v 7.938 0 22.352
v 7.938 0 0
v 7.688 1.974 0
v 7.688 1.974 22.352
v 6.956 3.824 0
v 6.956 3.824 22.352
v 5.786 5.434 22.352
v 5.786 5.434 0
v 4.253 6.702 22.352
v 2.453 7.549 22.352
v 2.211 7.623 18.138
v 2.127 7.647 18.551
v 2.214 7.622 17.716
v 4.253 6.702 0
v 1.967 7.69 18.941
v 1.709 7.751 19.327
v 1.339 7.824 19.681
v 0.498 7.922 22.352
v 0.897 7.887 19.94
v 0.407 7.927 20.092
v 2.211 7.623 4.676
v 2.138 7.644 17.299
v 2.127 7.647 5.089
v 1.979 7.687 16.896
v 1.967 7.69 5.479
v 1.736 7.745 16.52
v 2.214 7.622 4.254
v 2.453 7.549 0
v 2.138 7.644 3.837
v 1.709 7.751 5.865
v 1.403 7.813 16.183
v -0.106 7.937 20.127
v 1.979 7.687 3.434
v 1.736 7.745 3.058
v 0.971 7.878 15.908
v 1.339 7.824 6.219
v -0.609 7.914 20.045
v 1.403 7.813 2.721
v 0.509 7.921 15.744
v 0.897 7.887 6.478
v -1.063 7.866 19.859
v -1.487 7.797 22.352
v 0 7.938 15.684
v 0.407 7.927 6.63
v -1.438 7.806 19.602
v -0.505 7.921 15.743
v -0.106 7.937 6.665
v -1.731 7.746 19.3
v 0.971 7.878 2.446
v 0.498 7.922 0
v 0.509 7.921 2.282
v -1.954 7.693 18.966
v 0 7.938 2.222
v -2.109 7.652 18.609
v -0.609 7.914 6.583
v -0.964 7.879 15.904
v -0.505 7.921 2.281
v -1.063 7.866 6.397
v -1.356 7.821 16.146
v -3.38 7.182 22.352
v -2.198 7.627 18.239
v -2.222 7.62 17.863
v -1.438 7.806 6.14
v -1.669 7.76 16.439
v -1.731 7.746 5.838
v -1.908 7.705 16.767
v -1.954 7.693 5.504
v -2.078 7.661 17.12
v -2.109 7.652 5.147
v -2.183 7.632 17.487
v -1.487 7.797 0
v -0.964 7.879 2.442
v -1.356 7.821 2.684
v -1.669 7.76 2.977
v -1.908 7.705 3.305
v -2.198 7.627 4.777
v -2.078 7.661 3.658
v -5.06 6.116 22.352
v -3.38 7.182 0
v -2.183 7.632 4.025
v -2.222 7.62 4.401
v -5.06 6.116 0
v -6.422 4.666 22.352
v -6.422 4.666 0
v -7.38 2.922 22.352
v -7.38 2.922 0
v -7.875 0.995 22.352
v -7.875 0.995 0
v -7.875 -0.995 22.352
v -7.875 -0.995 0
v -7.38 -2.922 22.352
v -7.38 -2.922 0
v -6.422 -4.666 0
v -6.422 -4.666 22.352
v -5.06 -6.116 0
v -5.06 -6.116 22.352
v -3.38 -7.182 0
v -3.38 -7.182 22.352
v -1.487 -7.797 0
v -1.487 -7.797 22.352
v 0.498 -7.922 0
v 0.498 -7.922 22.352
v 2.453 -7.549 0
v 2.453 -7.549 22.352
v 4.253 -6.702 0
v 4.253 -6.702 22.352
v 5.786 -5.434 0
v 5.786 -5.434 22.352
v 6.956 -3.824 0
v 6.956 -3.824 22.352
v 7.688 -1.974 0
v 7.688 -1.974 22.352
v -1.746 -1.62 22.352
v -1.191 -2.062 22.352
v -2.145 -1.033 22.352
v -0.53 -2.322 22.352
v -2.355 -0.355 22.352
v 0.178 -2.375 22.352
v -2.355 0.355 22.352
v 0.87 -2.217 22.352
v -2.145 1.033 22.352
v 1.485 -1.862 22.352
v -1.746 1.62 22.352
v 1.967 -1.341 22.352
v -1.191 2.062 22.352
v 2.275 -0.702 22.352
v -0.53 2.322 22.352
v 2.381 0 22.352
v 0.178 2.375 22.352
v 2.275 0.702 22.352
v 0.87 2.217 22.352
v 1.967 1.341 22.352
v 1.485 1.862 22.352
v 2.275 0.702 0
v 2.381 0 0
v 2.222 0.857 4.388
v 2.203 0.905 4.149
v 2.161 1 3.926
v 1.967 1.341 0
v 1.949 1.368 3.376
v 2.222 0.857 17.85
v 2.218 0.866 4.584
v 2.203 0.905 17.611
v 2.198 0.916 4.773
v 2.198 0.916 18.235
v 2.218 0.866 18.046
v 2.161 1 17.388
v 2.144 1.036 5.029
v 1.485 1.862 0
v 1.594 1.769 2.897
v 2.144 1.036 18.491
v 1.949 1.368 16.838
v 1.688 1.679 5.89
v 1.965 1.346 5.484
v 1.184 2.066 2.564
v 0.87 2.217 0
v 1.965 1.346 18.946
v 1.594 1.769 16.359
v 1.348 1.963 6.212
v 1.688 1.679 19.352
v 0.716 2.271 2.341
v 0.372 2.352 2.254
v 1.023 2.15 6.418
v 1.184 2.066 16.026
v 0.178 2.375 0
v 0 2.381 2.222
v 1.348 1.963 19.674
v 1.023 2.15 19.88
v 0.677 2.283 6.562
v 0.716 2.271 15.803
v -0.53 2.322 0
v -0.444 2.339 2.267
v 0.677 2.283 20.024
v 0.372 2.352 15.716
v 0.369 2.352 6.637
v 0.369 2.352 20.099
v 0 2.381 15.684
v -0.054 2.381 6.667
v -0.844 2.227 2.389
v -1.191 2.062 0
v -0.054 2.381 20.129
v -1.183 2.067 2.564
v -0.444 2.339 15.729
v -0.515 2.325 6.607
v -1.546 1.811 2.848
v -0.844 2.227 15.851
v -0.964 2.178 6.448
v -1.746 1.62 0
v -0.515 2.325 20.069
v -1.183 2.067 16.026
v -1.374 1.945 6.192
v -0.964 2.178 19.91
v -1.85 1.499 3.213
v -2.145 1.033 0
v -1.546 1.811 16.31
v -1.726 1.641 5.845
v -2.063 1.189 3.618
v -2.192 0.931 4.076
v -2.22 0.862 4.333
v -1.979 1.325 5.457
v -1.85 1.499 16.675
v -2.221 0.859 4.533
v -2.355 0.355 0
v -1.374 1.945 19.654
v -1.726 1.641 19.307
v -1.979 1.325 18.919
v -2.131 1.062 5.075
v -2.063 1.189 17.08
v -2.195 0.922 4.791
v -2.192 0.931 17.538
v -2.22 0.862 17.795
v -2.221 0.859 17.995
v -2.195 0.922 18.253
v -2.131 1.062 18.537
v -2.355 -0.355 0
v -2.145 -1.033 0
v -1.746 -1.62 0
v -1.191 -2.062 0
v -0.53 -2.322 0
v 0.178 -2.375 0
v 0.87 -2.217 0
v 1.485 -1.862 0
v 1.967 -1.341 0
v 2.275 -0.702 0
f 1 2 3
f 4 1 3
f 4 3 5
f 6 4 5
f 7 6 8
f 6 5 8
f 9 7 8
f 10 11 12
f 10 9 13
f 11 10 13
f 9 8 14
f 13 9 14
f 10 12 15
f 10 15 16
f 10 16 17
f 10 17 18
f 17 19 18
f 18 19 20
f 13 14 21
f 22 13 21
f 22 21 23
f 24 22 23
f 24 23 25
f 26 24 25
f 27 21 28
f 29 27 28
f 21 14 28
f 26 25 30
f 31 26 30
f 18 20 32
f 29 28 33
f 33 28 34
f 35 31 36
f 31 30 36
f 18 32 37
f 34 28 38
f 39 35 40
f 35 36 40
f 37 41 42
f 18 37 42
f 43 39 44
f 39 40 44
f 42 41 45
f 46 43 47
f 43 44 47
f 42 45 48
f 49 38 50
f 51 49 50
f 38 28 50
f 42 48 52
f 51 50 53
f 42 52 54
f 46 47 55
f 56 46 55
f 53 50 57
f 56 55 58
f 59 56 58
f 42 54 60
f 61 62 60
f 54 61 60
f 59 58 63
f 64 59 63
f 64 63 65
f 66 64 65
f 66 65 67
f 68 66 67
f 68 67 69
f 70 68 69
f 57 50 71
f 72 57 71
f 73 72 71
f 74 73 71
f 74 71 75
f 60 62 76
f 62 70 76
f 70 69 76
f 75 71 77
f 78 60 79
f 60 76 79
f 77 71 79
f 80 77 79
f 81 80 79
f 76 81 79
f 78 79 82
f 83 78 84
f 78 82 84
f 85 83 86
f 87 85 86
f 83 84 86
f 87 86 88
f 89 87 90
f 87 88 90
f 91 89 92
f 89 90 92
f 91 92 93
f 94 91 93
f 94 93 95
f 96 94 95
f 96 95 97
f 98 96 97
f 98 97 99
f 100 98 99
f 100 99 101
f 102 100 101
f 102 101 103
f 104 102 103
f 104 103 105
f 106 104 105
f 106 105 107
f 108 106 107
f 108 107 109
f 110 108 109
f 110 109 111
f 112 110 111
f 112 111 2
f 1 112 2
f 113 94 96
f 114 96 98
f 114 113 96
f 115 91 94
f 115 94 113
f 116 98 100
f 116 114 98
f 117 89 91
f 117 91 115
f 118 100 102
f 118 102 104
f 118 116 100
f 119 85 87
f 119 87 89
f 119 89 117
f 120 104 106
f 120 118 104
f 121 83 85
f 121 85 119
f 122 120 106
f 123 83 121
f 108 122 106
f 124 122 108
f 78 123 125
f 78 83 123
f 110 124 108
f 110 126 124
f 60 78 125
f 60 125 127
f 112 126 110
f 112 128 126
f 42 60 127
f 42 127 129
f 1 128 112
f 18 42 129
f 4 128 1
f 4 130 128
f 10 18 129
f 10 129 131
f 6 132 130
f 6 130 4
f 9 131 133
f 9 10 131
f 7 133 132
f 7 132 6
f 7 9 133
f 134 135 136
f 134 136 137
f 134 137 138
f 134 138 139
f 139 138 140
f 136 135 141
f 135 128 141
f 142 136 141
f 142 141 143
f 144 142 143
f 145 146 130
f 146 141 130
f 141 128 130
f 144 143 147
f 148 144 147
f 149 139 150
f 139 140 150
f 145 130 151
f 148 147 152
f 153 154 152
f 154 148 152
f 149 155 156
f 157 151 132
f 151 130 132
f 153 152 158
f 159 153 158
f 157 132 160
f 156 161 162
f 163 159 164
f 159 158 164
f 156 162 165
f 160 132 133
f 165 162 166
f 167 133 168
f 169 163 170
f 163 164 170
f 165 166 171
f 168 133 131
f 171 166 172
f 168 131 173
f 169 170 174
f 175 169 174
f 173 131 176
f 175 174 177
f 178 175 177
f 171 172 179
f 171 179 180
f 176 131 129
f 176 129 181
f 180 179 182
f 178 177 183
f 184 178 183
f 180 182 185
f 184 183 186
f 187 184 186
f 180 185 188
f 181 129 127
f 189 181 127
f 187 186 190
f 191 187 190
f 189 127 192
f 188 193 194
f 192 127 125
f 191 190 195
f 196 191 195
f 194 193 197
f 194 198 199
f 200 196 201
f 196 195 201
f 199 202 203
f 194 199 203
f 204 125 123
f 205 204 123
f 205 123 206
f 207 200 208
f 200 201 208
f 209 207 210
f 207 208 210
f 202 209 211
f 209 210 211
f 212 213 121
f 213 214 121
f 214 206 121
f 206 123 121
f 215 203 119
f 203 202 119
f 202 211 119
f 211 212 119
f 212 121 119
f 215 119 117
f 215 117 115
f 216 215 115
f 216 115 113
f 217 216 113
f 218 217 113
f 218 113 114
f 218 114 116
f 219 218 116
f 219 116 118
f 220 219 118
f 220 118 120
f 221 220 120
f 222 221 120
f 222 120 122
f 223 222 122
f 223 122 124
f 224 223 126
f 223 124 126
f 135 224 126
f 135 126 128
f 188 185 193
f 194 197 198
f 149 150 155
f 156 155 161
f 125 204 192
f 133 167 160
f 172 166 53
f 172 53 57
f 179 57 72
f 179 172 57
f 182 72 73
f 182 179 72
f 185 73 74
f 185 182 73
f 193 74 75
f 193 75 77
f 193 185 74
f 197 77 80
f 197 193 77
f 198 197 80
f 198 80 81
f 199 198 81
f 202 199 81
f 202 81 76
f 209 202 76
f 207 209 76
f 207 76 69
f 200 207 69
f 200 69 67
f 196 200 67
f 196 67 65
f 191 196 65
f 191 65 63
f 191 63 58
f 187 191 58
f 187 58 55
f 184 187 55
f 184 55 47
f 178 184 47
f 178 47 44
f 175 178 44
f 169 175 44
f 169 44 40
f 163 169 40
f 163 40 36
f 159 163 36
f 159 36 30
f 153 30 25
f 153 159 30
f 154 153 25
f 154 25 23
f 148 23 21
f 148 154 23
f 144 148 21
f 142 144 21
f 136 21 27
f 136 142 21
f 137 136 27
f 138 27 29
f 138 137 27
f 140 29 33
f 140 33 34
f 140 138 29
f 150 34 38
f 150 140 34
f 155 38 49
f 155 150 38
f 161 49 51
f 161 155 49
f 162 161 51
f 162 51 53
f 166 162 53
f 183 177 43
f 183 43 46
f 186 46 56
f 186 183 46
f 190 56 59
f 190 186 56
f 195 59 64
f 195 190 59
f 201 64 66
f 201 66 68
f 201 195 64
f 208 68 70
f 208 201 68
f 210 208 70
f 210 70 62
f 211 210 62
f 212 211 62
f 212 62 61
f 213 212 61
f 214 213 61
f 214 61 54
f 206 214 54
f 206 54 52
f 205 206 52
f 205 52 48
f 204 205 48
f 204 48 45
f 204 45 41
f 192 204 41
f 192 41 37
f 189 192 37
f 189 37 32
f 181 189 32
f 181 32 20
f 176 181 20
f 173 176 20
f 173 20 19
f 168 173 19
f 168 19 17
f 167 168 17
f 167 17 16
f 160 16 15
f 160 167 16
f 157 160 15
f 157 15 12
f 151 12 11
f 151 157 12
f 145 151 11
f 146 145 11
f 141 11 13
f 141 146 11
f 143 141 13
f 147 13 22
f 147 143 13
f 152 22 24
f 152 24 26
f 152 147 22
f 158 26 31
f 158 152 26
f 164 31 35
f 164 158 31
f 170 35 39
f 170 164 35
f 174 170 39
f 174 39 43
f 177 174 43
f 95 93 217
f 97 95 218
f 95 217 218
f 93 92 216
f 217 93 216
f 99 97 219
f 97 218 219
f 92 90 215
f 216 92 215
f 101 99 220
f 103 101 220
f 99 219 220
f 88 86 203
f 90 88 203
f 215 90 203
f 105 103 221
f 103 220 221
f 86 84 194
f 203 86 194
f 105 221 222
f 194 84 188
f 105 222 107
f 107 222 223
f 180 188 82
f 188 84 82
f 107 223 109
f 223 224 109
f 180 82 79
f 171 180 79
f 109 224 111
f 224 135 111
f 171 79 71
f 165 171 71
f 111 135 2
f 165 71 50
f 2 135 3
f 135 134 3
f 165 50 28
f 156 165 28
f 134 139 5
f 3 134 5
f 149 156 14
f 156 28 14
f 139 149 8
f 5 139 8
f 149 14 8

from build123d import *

# Parameters (mm, degrees)
SKETCH1_R           = 7.9375
BOSS_EXTRUDE1_DEPTH = 22.352
SKETCH2_R           = 2.38125
CUT_EXTRUDE1_DEPTH  = 26.012391259
SKETCH3_R           = 2.2225
CUT_EXTRUDE2_DEPTH  = 26.012391259


with BuildPart() as part:
    # Sketch1 → Boss-Extrude1 (new body)
    with BuildSketch(Plane.XY):
        Circle(SKETCH1_R)
    extrude(amount=BOSS_EXTRUDE1_DEPTH)

    # Sketch2 → Cut-Extrude1 (cut, through all)
    with BuildSketch(Plane.XY.offset(22.352)):
        Circle(SKETCH2_R)
    extrude(amount=-CUT_EXTRUDE1_DEPTH, mode=Mode.SUBTRACT)

    # Sketch3 → Cut-Extrude2 (cut, through all)
    with BuildSketch(Plane(origin=(0, 0, 0), x_dir=(1, 0, 0), z_dir=(0, 1, 0))):
        with Locations(Location((0, -4.445, 0), (0, 0, 90))):
            Circle(SKETCH3_R)
        with Locations(Location((0, -17.907, 0), (0, 0, 90))):
            Circle(SKETCH3_R)
    extrude(amount=CUT_EXTRUDE2_DEPTH, mode=Mode.SUBTRACT)


solid = part.part
